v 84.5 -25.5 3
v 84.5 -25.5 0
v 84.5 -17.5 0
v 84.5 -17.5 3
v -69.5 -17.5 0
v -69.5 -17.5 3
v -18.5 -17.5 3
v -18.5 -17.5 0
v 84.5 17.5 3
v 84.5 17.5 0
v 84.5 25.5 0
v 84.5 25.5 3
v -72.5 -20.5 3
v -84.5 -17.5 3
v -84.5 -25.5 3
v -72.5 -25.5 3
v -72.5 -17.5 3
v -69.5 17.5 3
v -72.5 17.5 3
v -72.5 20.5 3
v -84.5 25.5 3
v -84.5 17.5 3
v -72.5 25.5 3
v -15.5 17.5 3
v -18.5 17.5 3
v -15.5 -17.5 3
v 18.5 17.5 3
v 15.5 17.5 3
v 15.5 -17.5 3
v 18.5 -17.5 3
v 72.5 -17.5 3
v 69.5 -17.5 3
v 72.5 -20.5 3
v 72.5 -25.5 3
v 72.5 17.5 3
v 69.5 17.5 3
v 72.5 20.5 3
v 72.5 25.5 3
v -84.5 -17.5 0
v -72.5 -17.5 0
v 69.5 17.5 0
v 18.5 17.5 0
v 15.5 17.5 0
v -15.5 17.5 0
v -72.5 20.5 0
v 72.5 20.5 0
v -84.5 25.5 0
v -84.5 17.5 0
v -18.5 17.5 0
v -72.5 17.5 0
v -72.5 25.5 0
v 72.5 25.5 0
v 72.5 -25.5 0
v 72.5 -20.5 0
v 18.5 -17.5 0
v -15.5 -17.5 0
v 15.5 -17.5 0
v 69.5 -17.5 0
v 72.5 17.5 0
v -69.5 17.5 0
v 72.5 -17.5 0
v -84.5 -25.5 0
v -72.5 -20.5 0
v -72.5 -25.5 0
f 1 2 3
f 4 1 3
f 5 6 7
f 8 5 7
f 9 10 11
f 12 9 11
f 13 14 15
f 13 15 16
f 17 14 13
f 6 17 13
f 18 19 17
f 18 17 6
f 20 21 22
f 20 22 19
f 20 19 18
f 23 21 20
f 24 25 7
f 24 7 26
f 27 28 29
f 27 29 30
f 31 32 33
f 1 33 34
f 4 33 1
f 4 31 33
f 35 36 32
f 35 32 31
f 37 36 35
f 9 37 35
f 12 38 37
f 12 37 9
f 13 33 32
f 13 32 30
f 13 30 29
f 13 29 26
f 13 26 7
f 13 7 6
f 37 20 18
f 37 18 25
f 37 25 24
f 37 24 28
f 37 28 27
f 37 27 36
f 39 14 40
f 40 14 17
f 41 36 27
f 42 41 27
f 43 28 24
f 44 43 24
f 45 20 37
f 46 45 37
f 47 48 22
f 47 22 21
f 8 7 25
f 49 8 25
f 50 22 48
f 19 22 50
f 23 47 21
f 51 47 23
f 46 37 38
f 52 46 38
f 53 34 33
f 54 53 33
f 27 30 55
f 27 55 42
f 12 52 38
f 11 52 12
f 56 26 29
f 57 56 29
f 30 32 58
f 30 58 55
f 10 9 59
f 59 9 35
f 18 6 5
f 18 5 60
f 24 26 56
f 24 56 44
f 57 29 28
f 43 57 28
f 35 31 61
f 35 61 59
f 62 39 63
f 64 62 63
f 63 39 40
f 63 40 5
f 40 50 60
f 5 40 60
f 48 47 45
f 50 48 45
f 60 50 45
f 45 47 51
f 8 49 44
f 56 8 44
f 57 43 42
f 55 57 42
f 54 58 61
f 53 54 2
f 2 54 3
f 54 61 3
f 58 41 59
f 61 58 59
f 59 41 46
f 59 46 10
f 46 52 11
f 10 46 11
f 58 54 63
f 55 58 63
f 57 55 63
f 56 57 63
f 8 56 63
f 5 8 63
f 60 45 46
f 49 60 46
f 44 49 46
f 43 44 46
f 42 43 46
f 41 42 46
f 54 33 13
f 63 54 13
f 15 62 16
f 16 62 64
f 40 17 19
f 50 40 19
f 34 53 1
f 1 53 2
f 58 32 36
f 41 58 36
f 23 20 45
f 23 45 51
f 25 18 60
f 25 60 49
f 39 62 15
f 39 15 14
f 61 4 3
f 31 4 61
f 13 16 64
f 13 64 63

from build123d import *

# Parameters (mm, degrees)
F0_W     = 169
F0_H     = 51
F1_DEPTH = 3
F2_W     = 51
F2_H     = 35
F2_W_2   = 12
F2_W_3   = 72.5
F2_H_2   = 5
F2_W_4   = 15.5
F3_DEPTH = 3


# Not quite as in the source:
# - a pattern or mirror of a feature is missing from the dataset's text; its kind, count and spacing are read off the source's solid


with BuildPart() as f1:
    # F0 (on Top) → F1 (new body)
    with BuildSketch(Plane.XY):
        Rectangle(F0_W, F0_H)
    extrude(amount=F1_DEPTH)

    # F2 (on face) → F3 (cut, through all)
    with BuildSketch(Plane.XY.offset(3)):
        with Locations((-44, 0)):
            Rectangle(F2_W, F2_H)
        with Locations((-78.5, 0)):
            Rectangle(F2_W_2, F2_H)
        with Locations((-36.25, 23)):
            Rectangle(F2_W_3, F2_H_2)
        with Locations((-36.25, -23)):
            Rectangle(F2_W_3, F2_H_2)
        with Locations((-7.75, 0)):
            Rectangle(F2_W_4, F2_H)
    f3 = extrude(amount=-F3_DEPTH, mode=Mode.SUBTRACT)

    # F3_copies: F3 across plane
    add(f3.mirror(Plane(origin=(0, 0, 0), x_dir=(0, 0, 1), z_dir=(1, 0, 0))), mode=Mode.SUBTRACT)


solid = f1.part
